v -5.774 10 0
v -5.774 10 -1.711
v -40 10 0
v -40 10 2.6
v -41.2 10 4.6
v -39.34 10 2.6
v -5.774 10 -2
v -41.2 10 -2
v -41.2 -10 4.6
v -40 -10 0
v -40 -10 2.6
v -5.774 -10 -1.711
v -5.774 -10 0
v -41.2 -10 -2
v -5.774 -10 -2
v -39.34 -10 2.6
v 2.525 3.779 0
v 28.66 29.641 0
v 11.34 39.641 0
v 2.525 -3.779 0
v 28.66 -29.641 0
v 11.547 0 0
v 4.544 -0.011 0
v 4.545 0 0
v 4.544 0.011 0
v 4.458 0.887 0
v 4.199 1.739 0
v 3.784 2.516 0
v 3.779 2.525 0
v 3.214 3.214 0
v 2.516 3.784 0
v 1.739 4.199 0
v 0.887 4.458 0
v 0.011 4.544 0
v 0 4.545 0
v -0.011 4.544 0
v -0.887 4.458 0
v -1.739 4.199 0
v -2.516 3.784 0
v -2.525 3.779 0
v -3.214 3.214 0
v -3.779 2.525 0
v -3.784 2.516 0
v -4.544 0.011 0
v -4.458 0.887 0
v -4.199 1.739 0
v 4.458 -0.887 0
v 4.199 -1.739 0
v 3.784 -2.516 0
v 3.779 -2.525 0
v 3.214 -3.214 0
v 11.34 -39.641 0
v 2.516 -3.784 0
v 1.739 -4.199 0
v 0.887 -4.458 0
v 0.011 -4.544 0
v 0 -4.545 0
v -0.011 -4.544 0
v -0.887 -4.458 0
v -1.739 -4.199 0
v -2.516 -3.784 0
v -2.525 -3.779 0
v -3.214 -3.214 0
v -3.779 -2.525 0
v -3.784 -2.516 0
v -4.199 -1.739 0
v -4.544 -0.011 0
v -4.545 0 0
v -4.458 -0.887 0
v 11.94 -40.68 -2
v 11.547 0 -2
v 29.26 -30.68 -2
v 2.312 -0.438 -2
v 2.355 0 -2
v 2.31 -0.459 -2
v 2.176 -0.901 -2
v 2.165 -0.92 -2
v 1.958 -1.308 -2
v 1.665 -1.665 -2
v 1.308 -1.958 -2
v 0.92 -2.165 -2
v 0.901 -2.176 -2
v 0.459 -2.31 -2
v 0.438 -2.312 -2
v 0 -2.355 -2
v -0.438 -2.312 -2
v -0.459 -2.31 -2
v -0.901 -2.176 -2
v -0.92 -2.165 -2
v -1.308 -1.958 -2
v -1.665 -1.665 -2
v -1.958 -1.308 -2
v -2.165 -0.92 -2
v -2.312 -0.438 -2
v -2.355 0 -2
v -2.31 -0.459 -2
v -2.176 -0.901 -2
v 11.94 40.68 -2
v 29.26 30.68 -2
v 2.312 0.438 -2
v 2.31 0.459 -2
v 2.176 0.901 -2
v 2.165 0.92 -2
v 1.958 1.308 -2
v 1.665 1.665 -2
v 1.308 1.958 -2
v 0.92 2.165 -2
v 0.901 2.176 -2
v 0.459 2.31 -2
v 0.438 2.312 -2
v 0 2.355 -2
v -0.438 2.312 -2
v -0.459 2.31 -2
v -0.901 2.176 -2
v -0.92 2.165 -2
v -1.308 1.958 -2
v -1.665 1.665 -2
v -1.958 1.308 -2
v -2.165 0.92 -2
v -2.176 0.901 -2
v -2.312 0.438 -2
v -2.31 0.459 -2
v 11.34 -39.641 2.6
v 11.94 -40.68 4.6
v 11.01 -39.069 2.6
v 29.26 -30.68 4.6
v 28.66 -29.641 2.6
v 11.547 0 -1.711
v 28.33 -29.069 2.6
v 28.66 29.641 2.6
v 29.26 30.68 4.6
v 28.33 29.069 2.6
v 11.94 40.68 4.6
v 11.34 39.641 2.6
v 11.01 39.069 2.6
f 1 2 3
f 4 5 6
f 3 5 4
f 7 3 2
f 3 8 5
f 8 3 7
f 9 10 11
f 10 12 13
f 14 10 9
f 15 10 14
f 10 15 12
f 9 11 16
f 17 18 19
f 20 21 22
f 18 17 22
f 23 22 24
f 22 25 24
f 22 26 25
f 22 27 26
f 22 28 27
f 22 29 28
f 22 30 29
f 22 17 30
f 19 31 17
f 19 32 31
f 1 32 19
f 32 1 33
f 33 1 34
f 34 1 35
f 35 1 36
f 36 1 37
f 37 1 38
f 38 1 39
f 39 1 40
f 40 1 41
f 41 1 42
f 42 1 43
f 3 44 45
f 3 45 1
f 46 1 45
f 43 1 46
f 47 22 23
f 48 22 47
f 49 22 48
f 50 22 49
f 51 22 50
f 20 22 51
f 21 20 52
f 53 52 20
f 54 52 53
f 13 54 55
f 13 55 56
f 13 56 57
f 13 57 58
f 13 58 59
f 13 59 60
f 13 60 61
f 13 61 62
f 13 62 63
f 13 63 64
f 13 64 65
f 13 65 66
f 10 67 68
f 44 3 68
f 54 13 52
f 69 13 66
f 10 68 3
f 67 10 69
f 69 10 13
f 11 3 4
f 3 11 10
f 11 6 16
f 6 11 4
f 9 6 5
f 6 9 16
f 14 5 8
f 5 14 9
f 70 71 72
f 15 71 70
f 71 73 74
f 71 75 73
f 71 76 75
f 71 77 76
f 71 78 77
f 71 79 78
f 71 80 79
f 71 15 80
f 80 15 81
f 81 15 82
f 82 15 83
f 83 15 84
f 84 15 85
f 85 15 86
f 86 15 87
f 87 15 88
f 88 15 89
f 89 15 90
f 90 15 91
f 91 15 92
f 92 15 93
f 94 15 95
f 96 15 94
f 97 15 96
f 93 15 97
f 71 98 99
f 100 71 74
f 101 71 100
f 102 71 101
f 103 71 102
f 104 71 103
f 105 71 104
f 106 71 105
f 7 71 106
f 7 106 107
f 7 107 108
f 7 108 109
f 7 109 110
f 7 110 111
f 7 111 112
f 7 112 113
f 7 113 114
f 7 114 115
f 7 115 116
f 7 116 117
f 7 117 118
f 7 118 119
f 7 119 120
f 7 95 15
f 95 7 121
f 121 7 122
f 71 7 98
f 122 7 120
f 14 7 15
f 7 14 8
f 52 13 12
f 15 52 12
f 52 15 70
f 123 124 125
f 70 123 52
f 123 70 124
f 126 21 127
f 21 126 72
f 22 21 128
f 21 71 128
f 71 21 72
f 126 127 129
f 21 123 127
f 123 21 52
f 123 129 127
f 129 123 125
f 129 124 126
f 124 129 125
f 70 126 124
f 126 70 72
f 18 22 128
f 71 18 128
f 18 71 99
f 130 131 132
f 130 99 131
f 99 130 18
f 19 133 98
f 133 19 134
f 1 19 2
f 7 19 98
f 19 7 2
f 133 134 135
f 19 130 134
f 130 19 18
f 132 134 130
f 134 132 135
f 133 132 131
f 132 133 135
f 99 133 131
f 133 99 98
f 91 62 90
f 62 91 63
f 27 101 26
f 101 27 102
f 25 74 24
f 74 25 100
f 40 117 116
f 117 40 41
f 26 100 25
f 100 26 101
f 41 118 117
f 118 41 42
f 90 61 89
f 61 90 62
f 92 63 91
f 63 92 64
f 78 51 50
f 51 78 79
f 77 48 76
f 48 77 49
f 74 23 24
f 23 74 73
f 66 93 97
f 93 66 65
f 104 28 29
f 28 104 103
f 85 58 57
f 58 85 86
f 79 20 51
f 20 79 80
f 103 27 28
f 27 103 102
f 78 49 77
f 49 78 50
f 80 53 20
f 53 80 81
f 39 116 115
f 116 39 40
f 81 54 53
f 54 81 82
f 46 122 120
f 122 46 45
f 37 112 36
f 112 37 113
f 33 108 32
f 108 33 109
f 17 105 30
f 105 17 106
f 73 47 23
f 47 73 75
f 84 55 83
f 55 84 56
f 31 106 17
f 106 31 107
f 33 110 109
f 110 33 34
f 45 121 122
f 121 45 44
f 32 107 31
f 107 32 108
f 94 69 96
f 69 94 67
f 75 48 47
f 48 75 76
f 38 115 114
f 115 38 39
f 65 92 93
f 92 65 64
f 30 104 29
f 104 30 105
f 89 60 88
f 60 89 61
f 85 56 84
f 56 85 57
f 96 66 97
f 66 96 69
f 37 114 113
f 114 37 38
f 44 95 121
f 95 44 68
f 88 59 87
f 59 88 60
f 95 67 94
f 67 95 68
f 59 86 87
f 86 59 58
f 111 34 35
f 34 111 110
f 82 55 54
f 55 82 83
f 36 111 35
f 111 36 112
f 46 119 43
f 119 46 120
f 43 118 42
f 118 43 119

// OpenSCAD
$fn=32;
width = 20;
strut_length = 40;
latch_height = 2;
overhang = 0.66;
wall_thickness = 2.6;
box_thickness = 2;
bottom_thickness = 2;
screw_hole_radius = 2.3;
screw_hole_width = 6;

outer_x = strut_length + 1.2;

module strut() {
  rotate([90,0,0])
  translate([0, 0, -width/2])
  linear_extrude(width)
  polygon([
    [-outer_x, -box_thickness],
    [-outer_x, wall_thickness + latch_height],
    [-strut_length + overhang, wall_thickness],
    [-strut_length, wall_thickness],
    [-strut_length, 0],
    [0, 0],
    [0, -box_thickness],
  ]);
}

difference() {
  union() {
    strut();
    rotate([0,0,120])
    strut();
    rotate([0,0,-120])
    strut();
  }
  
  translate([0,0, -box_thickness-0.05])
  linear_extrude(box_thickness + 0.1, scale=2) 
  circle(r=screw_hole_radius);
}
  
